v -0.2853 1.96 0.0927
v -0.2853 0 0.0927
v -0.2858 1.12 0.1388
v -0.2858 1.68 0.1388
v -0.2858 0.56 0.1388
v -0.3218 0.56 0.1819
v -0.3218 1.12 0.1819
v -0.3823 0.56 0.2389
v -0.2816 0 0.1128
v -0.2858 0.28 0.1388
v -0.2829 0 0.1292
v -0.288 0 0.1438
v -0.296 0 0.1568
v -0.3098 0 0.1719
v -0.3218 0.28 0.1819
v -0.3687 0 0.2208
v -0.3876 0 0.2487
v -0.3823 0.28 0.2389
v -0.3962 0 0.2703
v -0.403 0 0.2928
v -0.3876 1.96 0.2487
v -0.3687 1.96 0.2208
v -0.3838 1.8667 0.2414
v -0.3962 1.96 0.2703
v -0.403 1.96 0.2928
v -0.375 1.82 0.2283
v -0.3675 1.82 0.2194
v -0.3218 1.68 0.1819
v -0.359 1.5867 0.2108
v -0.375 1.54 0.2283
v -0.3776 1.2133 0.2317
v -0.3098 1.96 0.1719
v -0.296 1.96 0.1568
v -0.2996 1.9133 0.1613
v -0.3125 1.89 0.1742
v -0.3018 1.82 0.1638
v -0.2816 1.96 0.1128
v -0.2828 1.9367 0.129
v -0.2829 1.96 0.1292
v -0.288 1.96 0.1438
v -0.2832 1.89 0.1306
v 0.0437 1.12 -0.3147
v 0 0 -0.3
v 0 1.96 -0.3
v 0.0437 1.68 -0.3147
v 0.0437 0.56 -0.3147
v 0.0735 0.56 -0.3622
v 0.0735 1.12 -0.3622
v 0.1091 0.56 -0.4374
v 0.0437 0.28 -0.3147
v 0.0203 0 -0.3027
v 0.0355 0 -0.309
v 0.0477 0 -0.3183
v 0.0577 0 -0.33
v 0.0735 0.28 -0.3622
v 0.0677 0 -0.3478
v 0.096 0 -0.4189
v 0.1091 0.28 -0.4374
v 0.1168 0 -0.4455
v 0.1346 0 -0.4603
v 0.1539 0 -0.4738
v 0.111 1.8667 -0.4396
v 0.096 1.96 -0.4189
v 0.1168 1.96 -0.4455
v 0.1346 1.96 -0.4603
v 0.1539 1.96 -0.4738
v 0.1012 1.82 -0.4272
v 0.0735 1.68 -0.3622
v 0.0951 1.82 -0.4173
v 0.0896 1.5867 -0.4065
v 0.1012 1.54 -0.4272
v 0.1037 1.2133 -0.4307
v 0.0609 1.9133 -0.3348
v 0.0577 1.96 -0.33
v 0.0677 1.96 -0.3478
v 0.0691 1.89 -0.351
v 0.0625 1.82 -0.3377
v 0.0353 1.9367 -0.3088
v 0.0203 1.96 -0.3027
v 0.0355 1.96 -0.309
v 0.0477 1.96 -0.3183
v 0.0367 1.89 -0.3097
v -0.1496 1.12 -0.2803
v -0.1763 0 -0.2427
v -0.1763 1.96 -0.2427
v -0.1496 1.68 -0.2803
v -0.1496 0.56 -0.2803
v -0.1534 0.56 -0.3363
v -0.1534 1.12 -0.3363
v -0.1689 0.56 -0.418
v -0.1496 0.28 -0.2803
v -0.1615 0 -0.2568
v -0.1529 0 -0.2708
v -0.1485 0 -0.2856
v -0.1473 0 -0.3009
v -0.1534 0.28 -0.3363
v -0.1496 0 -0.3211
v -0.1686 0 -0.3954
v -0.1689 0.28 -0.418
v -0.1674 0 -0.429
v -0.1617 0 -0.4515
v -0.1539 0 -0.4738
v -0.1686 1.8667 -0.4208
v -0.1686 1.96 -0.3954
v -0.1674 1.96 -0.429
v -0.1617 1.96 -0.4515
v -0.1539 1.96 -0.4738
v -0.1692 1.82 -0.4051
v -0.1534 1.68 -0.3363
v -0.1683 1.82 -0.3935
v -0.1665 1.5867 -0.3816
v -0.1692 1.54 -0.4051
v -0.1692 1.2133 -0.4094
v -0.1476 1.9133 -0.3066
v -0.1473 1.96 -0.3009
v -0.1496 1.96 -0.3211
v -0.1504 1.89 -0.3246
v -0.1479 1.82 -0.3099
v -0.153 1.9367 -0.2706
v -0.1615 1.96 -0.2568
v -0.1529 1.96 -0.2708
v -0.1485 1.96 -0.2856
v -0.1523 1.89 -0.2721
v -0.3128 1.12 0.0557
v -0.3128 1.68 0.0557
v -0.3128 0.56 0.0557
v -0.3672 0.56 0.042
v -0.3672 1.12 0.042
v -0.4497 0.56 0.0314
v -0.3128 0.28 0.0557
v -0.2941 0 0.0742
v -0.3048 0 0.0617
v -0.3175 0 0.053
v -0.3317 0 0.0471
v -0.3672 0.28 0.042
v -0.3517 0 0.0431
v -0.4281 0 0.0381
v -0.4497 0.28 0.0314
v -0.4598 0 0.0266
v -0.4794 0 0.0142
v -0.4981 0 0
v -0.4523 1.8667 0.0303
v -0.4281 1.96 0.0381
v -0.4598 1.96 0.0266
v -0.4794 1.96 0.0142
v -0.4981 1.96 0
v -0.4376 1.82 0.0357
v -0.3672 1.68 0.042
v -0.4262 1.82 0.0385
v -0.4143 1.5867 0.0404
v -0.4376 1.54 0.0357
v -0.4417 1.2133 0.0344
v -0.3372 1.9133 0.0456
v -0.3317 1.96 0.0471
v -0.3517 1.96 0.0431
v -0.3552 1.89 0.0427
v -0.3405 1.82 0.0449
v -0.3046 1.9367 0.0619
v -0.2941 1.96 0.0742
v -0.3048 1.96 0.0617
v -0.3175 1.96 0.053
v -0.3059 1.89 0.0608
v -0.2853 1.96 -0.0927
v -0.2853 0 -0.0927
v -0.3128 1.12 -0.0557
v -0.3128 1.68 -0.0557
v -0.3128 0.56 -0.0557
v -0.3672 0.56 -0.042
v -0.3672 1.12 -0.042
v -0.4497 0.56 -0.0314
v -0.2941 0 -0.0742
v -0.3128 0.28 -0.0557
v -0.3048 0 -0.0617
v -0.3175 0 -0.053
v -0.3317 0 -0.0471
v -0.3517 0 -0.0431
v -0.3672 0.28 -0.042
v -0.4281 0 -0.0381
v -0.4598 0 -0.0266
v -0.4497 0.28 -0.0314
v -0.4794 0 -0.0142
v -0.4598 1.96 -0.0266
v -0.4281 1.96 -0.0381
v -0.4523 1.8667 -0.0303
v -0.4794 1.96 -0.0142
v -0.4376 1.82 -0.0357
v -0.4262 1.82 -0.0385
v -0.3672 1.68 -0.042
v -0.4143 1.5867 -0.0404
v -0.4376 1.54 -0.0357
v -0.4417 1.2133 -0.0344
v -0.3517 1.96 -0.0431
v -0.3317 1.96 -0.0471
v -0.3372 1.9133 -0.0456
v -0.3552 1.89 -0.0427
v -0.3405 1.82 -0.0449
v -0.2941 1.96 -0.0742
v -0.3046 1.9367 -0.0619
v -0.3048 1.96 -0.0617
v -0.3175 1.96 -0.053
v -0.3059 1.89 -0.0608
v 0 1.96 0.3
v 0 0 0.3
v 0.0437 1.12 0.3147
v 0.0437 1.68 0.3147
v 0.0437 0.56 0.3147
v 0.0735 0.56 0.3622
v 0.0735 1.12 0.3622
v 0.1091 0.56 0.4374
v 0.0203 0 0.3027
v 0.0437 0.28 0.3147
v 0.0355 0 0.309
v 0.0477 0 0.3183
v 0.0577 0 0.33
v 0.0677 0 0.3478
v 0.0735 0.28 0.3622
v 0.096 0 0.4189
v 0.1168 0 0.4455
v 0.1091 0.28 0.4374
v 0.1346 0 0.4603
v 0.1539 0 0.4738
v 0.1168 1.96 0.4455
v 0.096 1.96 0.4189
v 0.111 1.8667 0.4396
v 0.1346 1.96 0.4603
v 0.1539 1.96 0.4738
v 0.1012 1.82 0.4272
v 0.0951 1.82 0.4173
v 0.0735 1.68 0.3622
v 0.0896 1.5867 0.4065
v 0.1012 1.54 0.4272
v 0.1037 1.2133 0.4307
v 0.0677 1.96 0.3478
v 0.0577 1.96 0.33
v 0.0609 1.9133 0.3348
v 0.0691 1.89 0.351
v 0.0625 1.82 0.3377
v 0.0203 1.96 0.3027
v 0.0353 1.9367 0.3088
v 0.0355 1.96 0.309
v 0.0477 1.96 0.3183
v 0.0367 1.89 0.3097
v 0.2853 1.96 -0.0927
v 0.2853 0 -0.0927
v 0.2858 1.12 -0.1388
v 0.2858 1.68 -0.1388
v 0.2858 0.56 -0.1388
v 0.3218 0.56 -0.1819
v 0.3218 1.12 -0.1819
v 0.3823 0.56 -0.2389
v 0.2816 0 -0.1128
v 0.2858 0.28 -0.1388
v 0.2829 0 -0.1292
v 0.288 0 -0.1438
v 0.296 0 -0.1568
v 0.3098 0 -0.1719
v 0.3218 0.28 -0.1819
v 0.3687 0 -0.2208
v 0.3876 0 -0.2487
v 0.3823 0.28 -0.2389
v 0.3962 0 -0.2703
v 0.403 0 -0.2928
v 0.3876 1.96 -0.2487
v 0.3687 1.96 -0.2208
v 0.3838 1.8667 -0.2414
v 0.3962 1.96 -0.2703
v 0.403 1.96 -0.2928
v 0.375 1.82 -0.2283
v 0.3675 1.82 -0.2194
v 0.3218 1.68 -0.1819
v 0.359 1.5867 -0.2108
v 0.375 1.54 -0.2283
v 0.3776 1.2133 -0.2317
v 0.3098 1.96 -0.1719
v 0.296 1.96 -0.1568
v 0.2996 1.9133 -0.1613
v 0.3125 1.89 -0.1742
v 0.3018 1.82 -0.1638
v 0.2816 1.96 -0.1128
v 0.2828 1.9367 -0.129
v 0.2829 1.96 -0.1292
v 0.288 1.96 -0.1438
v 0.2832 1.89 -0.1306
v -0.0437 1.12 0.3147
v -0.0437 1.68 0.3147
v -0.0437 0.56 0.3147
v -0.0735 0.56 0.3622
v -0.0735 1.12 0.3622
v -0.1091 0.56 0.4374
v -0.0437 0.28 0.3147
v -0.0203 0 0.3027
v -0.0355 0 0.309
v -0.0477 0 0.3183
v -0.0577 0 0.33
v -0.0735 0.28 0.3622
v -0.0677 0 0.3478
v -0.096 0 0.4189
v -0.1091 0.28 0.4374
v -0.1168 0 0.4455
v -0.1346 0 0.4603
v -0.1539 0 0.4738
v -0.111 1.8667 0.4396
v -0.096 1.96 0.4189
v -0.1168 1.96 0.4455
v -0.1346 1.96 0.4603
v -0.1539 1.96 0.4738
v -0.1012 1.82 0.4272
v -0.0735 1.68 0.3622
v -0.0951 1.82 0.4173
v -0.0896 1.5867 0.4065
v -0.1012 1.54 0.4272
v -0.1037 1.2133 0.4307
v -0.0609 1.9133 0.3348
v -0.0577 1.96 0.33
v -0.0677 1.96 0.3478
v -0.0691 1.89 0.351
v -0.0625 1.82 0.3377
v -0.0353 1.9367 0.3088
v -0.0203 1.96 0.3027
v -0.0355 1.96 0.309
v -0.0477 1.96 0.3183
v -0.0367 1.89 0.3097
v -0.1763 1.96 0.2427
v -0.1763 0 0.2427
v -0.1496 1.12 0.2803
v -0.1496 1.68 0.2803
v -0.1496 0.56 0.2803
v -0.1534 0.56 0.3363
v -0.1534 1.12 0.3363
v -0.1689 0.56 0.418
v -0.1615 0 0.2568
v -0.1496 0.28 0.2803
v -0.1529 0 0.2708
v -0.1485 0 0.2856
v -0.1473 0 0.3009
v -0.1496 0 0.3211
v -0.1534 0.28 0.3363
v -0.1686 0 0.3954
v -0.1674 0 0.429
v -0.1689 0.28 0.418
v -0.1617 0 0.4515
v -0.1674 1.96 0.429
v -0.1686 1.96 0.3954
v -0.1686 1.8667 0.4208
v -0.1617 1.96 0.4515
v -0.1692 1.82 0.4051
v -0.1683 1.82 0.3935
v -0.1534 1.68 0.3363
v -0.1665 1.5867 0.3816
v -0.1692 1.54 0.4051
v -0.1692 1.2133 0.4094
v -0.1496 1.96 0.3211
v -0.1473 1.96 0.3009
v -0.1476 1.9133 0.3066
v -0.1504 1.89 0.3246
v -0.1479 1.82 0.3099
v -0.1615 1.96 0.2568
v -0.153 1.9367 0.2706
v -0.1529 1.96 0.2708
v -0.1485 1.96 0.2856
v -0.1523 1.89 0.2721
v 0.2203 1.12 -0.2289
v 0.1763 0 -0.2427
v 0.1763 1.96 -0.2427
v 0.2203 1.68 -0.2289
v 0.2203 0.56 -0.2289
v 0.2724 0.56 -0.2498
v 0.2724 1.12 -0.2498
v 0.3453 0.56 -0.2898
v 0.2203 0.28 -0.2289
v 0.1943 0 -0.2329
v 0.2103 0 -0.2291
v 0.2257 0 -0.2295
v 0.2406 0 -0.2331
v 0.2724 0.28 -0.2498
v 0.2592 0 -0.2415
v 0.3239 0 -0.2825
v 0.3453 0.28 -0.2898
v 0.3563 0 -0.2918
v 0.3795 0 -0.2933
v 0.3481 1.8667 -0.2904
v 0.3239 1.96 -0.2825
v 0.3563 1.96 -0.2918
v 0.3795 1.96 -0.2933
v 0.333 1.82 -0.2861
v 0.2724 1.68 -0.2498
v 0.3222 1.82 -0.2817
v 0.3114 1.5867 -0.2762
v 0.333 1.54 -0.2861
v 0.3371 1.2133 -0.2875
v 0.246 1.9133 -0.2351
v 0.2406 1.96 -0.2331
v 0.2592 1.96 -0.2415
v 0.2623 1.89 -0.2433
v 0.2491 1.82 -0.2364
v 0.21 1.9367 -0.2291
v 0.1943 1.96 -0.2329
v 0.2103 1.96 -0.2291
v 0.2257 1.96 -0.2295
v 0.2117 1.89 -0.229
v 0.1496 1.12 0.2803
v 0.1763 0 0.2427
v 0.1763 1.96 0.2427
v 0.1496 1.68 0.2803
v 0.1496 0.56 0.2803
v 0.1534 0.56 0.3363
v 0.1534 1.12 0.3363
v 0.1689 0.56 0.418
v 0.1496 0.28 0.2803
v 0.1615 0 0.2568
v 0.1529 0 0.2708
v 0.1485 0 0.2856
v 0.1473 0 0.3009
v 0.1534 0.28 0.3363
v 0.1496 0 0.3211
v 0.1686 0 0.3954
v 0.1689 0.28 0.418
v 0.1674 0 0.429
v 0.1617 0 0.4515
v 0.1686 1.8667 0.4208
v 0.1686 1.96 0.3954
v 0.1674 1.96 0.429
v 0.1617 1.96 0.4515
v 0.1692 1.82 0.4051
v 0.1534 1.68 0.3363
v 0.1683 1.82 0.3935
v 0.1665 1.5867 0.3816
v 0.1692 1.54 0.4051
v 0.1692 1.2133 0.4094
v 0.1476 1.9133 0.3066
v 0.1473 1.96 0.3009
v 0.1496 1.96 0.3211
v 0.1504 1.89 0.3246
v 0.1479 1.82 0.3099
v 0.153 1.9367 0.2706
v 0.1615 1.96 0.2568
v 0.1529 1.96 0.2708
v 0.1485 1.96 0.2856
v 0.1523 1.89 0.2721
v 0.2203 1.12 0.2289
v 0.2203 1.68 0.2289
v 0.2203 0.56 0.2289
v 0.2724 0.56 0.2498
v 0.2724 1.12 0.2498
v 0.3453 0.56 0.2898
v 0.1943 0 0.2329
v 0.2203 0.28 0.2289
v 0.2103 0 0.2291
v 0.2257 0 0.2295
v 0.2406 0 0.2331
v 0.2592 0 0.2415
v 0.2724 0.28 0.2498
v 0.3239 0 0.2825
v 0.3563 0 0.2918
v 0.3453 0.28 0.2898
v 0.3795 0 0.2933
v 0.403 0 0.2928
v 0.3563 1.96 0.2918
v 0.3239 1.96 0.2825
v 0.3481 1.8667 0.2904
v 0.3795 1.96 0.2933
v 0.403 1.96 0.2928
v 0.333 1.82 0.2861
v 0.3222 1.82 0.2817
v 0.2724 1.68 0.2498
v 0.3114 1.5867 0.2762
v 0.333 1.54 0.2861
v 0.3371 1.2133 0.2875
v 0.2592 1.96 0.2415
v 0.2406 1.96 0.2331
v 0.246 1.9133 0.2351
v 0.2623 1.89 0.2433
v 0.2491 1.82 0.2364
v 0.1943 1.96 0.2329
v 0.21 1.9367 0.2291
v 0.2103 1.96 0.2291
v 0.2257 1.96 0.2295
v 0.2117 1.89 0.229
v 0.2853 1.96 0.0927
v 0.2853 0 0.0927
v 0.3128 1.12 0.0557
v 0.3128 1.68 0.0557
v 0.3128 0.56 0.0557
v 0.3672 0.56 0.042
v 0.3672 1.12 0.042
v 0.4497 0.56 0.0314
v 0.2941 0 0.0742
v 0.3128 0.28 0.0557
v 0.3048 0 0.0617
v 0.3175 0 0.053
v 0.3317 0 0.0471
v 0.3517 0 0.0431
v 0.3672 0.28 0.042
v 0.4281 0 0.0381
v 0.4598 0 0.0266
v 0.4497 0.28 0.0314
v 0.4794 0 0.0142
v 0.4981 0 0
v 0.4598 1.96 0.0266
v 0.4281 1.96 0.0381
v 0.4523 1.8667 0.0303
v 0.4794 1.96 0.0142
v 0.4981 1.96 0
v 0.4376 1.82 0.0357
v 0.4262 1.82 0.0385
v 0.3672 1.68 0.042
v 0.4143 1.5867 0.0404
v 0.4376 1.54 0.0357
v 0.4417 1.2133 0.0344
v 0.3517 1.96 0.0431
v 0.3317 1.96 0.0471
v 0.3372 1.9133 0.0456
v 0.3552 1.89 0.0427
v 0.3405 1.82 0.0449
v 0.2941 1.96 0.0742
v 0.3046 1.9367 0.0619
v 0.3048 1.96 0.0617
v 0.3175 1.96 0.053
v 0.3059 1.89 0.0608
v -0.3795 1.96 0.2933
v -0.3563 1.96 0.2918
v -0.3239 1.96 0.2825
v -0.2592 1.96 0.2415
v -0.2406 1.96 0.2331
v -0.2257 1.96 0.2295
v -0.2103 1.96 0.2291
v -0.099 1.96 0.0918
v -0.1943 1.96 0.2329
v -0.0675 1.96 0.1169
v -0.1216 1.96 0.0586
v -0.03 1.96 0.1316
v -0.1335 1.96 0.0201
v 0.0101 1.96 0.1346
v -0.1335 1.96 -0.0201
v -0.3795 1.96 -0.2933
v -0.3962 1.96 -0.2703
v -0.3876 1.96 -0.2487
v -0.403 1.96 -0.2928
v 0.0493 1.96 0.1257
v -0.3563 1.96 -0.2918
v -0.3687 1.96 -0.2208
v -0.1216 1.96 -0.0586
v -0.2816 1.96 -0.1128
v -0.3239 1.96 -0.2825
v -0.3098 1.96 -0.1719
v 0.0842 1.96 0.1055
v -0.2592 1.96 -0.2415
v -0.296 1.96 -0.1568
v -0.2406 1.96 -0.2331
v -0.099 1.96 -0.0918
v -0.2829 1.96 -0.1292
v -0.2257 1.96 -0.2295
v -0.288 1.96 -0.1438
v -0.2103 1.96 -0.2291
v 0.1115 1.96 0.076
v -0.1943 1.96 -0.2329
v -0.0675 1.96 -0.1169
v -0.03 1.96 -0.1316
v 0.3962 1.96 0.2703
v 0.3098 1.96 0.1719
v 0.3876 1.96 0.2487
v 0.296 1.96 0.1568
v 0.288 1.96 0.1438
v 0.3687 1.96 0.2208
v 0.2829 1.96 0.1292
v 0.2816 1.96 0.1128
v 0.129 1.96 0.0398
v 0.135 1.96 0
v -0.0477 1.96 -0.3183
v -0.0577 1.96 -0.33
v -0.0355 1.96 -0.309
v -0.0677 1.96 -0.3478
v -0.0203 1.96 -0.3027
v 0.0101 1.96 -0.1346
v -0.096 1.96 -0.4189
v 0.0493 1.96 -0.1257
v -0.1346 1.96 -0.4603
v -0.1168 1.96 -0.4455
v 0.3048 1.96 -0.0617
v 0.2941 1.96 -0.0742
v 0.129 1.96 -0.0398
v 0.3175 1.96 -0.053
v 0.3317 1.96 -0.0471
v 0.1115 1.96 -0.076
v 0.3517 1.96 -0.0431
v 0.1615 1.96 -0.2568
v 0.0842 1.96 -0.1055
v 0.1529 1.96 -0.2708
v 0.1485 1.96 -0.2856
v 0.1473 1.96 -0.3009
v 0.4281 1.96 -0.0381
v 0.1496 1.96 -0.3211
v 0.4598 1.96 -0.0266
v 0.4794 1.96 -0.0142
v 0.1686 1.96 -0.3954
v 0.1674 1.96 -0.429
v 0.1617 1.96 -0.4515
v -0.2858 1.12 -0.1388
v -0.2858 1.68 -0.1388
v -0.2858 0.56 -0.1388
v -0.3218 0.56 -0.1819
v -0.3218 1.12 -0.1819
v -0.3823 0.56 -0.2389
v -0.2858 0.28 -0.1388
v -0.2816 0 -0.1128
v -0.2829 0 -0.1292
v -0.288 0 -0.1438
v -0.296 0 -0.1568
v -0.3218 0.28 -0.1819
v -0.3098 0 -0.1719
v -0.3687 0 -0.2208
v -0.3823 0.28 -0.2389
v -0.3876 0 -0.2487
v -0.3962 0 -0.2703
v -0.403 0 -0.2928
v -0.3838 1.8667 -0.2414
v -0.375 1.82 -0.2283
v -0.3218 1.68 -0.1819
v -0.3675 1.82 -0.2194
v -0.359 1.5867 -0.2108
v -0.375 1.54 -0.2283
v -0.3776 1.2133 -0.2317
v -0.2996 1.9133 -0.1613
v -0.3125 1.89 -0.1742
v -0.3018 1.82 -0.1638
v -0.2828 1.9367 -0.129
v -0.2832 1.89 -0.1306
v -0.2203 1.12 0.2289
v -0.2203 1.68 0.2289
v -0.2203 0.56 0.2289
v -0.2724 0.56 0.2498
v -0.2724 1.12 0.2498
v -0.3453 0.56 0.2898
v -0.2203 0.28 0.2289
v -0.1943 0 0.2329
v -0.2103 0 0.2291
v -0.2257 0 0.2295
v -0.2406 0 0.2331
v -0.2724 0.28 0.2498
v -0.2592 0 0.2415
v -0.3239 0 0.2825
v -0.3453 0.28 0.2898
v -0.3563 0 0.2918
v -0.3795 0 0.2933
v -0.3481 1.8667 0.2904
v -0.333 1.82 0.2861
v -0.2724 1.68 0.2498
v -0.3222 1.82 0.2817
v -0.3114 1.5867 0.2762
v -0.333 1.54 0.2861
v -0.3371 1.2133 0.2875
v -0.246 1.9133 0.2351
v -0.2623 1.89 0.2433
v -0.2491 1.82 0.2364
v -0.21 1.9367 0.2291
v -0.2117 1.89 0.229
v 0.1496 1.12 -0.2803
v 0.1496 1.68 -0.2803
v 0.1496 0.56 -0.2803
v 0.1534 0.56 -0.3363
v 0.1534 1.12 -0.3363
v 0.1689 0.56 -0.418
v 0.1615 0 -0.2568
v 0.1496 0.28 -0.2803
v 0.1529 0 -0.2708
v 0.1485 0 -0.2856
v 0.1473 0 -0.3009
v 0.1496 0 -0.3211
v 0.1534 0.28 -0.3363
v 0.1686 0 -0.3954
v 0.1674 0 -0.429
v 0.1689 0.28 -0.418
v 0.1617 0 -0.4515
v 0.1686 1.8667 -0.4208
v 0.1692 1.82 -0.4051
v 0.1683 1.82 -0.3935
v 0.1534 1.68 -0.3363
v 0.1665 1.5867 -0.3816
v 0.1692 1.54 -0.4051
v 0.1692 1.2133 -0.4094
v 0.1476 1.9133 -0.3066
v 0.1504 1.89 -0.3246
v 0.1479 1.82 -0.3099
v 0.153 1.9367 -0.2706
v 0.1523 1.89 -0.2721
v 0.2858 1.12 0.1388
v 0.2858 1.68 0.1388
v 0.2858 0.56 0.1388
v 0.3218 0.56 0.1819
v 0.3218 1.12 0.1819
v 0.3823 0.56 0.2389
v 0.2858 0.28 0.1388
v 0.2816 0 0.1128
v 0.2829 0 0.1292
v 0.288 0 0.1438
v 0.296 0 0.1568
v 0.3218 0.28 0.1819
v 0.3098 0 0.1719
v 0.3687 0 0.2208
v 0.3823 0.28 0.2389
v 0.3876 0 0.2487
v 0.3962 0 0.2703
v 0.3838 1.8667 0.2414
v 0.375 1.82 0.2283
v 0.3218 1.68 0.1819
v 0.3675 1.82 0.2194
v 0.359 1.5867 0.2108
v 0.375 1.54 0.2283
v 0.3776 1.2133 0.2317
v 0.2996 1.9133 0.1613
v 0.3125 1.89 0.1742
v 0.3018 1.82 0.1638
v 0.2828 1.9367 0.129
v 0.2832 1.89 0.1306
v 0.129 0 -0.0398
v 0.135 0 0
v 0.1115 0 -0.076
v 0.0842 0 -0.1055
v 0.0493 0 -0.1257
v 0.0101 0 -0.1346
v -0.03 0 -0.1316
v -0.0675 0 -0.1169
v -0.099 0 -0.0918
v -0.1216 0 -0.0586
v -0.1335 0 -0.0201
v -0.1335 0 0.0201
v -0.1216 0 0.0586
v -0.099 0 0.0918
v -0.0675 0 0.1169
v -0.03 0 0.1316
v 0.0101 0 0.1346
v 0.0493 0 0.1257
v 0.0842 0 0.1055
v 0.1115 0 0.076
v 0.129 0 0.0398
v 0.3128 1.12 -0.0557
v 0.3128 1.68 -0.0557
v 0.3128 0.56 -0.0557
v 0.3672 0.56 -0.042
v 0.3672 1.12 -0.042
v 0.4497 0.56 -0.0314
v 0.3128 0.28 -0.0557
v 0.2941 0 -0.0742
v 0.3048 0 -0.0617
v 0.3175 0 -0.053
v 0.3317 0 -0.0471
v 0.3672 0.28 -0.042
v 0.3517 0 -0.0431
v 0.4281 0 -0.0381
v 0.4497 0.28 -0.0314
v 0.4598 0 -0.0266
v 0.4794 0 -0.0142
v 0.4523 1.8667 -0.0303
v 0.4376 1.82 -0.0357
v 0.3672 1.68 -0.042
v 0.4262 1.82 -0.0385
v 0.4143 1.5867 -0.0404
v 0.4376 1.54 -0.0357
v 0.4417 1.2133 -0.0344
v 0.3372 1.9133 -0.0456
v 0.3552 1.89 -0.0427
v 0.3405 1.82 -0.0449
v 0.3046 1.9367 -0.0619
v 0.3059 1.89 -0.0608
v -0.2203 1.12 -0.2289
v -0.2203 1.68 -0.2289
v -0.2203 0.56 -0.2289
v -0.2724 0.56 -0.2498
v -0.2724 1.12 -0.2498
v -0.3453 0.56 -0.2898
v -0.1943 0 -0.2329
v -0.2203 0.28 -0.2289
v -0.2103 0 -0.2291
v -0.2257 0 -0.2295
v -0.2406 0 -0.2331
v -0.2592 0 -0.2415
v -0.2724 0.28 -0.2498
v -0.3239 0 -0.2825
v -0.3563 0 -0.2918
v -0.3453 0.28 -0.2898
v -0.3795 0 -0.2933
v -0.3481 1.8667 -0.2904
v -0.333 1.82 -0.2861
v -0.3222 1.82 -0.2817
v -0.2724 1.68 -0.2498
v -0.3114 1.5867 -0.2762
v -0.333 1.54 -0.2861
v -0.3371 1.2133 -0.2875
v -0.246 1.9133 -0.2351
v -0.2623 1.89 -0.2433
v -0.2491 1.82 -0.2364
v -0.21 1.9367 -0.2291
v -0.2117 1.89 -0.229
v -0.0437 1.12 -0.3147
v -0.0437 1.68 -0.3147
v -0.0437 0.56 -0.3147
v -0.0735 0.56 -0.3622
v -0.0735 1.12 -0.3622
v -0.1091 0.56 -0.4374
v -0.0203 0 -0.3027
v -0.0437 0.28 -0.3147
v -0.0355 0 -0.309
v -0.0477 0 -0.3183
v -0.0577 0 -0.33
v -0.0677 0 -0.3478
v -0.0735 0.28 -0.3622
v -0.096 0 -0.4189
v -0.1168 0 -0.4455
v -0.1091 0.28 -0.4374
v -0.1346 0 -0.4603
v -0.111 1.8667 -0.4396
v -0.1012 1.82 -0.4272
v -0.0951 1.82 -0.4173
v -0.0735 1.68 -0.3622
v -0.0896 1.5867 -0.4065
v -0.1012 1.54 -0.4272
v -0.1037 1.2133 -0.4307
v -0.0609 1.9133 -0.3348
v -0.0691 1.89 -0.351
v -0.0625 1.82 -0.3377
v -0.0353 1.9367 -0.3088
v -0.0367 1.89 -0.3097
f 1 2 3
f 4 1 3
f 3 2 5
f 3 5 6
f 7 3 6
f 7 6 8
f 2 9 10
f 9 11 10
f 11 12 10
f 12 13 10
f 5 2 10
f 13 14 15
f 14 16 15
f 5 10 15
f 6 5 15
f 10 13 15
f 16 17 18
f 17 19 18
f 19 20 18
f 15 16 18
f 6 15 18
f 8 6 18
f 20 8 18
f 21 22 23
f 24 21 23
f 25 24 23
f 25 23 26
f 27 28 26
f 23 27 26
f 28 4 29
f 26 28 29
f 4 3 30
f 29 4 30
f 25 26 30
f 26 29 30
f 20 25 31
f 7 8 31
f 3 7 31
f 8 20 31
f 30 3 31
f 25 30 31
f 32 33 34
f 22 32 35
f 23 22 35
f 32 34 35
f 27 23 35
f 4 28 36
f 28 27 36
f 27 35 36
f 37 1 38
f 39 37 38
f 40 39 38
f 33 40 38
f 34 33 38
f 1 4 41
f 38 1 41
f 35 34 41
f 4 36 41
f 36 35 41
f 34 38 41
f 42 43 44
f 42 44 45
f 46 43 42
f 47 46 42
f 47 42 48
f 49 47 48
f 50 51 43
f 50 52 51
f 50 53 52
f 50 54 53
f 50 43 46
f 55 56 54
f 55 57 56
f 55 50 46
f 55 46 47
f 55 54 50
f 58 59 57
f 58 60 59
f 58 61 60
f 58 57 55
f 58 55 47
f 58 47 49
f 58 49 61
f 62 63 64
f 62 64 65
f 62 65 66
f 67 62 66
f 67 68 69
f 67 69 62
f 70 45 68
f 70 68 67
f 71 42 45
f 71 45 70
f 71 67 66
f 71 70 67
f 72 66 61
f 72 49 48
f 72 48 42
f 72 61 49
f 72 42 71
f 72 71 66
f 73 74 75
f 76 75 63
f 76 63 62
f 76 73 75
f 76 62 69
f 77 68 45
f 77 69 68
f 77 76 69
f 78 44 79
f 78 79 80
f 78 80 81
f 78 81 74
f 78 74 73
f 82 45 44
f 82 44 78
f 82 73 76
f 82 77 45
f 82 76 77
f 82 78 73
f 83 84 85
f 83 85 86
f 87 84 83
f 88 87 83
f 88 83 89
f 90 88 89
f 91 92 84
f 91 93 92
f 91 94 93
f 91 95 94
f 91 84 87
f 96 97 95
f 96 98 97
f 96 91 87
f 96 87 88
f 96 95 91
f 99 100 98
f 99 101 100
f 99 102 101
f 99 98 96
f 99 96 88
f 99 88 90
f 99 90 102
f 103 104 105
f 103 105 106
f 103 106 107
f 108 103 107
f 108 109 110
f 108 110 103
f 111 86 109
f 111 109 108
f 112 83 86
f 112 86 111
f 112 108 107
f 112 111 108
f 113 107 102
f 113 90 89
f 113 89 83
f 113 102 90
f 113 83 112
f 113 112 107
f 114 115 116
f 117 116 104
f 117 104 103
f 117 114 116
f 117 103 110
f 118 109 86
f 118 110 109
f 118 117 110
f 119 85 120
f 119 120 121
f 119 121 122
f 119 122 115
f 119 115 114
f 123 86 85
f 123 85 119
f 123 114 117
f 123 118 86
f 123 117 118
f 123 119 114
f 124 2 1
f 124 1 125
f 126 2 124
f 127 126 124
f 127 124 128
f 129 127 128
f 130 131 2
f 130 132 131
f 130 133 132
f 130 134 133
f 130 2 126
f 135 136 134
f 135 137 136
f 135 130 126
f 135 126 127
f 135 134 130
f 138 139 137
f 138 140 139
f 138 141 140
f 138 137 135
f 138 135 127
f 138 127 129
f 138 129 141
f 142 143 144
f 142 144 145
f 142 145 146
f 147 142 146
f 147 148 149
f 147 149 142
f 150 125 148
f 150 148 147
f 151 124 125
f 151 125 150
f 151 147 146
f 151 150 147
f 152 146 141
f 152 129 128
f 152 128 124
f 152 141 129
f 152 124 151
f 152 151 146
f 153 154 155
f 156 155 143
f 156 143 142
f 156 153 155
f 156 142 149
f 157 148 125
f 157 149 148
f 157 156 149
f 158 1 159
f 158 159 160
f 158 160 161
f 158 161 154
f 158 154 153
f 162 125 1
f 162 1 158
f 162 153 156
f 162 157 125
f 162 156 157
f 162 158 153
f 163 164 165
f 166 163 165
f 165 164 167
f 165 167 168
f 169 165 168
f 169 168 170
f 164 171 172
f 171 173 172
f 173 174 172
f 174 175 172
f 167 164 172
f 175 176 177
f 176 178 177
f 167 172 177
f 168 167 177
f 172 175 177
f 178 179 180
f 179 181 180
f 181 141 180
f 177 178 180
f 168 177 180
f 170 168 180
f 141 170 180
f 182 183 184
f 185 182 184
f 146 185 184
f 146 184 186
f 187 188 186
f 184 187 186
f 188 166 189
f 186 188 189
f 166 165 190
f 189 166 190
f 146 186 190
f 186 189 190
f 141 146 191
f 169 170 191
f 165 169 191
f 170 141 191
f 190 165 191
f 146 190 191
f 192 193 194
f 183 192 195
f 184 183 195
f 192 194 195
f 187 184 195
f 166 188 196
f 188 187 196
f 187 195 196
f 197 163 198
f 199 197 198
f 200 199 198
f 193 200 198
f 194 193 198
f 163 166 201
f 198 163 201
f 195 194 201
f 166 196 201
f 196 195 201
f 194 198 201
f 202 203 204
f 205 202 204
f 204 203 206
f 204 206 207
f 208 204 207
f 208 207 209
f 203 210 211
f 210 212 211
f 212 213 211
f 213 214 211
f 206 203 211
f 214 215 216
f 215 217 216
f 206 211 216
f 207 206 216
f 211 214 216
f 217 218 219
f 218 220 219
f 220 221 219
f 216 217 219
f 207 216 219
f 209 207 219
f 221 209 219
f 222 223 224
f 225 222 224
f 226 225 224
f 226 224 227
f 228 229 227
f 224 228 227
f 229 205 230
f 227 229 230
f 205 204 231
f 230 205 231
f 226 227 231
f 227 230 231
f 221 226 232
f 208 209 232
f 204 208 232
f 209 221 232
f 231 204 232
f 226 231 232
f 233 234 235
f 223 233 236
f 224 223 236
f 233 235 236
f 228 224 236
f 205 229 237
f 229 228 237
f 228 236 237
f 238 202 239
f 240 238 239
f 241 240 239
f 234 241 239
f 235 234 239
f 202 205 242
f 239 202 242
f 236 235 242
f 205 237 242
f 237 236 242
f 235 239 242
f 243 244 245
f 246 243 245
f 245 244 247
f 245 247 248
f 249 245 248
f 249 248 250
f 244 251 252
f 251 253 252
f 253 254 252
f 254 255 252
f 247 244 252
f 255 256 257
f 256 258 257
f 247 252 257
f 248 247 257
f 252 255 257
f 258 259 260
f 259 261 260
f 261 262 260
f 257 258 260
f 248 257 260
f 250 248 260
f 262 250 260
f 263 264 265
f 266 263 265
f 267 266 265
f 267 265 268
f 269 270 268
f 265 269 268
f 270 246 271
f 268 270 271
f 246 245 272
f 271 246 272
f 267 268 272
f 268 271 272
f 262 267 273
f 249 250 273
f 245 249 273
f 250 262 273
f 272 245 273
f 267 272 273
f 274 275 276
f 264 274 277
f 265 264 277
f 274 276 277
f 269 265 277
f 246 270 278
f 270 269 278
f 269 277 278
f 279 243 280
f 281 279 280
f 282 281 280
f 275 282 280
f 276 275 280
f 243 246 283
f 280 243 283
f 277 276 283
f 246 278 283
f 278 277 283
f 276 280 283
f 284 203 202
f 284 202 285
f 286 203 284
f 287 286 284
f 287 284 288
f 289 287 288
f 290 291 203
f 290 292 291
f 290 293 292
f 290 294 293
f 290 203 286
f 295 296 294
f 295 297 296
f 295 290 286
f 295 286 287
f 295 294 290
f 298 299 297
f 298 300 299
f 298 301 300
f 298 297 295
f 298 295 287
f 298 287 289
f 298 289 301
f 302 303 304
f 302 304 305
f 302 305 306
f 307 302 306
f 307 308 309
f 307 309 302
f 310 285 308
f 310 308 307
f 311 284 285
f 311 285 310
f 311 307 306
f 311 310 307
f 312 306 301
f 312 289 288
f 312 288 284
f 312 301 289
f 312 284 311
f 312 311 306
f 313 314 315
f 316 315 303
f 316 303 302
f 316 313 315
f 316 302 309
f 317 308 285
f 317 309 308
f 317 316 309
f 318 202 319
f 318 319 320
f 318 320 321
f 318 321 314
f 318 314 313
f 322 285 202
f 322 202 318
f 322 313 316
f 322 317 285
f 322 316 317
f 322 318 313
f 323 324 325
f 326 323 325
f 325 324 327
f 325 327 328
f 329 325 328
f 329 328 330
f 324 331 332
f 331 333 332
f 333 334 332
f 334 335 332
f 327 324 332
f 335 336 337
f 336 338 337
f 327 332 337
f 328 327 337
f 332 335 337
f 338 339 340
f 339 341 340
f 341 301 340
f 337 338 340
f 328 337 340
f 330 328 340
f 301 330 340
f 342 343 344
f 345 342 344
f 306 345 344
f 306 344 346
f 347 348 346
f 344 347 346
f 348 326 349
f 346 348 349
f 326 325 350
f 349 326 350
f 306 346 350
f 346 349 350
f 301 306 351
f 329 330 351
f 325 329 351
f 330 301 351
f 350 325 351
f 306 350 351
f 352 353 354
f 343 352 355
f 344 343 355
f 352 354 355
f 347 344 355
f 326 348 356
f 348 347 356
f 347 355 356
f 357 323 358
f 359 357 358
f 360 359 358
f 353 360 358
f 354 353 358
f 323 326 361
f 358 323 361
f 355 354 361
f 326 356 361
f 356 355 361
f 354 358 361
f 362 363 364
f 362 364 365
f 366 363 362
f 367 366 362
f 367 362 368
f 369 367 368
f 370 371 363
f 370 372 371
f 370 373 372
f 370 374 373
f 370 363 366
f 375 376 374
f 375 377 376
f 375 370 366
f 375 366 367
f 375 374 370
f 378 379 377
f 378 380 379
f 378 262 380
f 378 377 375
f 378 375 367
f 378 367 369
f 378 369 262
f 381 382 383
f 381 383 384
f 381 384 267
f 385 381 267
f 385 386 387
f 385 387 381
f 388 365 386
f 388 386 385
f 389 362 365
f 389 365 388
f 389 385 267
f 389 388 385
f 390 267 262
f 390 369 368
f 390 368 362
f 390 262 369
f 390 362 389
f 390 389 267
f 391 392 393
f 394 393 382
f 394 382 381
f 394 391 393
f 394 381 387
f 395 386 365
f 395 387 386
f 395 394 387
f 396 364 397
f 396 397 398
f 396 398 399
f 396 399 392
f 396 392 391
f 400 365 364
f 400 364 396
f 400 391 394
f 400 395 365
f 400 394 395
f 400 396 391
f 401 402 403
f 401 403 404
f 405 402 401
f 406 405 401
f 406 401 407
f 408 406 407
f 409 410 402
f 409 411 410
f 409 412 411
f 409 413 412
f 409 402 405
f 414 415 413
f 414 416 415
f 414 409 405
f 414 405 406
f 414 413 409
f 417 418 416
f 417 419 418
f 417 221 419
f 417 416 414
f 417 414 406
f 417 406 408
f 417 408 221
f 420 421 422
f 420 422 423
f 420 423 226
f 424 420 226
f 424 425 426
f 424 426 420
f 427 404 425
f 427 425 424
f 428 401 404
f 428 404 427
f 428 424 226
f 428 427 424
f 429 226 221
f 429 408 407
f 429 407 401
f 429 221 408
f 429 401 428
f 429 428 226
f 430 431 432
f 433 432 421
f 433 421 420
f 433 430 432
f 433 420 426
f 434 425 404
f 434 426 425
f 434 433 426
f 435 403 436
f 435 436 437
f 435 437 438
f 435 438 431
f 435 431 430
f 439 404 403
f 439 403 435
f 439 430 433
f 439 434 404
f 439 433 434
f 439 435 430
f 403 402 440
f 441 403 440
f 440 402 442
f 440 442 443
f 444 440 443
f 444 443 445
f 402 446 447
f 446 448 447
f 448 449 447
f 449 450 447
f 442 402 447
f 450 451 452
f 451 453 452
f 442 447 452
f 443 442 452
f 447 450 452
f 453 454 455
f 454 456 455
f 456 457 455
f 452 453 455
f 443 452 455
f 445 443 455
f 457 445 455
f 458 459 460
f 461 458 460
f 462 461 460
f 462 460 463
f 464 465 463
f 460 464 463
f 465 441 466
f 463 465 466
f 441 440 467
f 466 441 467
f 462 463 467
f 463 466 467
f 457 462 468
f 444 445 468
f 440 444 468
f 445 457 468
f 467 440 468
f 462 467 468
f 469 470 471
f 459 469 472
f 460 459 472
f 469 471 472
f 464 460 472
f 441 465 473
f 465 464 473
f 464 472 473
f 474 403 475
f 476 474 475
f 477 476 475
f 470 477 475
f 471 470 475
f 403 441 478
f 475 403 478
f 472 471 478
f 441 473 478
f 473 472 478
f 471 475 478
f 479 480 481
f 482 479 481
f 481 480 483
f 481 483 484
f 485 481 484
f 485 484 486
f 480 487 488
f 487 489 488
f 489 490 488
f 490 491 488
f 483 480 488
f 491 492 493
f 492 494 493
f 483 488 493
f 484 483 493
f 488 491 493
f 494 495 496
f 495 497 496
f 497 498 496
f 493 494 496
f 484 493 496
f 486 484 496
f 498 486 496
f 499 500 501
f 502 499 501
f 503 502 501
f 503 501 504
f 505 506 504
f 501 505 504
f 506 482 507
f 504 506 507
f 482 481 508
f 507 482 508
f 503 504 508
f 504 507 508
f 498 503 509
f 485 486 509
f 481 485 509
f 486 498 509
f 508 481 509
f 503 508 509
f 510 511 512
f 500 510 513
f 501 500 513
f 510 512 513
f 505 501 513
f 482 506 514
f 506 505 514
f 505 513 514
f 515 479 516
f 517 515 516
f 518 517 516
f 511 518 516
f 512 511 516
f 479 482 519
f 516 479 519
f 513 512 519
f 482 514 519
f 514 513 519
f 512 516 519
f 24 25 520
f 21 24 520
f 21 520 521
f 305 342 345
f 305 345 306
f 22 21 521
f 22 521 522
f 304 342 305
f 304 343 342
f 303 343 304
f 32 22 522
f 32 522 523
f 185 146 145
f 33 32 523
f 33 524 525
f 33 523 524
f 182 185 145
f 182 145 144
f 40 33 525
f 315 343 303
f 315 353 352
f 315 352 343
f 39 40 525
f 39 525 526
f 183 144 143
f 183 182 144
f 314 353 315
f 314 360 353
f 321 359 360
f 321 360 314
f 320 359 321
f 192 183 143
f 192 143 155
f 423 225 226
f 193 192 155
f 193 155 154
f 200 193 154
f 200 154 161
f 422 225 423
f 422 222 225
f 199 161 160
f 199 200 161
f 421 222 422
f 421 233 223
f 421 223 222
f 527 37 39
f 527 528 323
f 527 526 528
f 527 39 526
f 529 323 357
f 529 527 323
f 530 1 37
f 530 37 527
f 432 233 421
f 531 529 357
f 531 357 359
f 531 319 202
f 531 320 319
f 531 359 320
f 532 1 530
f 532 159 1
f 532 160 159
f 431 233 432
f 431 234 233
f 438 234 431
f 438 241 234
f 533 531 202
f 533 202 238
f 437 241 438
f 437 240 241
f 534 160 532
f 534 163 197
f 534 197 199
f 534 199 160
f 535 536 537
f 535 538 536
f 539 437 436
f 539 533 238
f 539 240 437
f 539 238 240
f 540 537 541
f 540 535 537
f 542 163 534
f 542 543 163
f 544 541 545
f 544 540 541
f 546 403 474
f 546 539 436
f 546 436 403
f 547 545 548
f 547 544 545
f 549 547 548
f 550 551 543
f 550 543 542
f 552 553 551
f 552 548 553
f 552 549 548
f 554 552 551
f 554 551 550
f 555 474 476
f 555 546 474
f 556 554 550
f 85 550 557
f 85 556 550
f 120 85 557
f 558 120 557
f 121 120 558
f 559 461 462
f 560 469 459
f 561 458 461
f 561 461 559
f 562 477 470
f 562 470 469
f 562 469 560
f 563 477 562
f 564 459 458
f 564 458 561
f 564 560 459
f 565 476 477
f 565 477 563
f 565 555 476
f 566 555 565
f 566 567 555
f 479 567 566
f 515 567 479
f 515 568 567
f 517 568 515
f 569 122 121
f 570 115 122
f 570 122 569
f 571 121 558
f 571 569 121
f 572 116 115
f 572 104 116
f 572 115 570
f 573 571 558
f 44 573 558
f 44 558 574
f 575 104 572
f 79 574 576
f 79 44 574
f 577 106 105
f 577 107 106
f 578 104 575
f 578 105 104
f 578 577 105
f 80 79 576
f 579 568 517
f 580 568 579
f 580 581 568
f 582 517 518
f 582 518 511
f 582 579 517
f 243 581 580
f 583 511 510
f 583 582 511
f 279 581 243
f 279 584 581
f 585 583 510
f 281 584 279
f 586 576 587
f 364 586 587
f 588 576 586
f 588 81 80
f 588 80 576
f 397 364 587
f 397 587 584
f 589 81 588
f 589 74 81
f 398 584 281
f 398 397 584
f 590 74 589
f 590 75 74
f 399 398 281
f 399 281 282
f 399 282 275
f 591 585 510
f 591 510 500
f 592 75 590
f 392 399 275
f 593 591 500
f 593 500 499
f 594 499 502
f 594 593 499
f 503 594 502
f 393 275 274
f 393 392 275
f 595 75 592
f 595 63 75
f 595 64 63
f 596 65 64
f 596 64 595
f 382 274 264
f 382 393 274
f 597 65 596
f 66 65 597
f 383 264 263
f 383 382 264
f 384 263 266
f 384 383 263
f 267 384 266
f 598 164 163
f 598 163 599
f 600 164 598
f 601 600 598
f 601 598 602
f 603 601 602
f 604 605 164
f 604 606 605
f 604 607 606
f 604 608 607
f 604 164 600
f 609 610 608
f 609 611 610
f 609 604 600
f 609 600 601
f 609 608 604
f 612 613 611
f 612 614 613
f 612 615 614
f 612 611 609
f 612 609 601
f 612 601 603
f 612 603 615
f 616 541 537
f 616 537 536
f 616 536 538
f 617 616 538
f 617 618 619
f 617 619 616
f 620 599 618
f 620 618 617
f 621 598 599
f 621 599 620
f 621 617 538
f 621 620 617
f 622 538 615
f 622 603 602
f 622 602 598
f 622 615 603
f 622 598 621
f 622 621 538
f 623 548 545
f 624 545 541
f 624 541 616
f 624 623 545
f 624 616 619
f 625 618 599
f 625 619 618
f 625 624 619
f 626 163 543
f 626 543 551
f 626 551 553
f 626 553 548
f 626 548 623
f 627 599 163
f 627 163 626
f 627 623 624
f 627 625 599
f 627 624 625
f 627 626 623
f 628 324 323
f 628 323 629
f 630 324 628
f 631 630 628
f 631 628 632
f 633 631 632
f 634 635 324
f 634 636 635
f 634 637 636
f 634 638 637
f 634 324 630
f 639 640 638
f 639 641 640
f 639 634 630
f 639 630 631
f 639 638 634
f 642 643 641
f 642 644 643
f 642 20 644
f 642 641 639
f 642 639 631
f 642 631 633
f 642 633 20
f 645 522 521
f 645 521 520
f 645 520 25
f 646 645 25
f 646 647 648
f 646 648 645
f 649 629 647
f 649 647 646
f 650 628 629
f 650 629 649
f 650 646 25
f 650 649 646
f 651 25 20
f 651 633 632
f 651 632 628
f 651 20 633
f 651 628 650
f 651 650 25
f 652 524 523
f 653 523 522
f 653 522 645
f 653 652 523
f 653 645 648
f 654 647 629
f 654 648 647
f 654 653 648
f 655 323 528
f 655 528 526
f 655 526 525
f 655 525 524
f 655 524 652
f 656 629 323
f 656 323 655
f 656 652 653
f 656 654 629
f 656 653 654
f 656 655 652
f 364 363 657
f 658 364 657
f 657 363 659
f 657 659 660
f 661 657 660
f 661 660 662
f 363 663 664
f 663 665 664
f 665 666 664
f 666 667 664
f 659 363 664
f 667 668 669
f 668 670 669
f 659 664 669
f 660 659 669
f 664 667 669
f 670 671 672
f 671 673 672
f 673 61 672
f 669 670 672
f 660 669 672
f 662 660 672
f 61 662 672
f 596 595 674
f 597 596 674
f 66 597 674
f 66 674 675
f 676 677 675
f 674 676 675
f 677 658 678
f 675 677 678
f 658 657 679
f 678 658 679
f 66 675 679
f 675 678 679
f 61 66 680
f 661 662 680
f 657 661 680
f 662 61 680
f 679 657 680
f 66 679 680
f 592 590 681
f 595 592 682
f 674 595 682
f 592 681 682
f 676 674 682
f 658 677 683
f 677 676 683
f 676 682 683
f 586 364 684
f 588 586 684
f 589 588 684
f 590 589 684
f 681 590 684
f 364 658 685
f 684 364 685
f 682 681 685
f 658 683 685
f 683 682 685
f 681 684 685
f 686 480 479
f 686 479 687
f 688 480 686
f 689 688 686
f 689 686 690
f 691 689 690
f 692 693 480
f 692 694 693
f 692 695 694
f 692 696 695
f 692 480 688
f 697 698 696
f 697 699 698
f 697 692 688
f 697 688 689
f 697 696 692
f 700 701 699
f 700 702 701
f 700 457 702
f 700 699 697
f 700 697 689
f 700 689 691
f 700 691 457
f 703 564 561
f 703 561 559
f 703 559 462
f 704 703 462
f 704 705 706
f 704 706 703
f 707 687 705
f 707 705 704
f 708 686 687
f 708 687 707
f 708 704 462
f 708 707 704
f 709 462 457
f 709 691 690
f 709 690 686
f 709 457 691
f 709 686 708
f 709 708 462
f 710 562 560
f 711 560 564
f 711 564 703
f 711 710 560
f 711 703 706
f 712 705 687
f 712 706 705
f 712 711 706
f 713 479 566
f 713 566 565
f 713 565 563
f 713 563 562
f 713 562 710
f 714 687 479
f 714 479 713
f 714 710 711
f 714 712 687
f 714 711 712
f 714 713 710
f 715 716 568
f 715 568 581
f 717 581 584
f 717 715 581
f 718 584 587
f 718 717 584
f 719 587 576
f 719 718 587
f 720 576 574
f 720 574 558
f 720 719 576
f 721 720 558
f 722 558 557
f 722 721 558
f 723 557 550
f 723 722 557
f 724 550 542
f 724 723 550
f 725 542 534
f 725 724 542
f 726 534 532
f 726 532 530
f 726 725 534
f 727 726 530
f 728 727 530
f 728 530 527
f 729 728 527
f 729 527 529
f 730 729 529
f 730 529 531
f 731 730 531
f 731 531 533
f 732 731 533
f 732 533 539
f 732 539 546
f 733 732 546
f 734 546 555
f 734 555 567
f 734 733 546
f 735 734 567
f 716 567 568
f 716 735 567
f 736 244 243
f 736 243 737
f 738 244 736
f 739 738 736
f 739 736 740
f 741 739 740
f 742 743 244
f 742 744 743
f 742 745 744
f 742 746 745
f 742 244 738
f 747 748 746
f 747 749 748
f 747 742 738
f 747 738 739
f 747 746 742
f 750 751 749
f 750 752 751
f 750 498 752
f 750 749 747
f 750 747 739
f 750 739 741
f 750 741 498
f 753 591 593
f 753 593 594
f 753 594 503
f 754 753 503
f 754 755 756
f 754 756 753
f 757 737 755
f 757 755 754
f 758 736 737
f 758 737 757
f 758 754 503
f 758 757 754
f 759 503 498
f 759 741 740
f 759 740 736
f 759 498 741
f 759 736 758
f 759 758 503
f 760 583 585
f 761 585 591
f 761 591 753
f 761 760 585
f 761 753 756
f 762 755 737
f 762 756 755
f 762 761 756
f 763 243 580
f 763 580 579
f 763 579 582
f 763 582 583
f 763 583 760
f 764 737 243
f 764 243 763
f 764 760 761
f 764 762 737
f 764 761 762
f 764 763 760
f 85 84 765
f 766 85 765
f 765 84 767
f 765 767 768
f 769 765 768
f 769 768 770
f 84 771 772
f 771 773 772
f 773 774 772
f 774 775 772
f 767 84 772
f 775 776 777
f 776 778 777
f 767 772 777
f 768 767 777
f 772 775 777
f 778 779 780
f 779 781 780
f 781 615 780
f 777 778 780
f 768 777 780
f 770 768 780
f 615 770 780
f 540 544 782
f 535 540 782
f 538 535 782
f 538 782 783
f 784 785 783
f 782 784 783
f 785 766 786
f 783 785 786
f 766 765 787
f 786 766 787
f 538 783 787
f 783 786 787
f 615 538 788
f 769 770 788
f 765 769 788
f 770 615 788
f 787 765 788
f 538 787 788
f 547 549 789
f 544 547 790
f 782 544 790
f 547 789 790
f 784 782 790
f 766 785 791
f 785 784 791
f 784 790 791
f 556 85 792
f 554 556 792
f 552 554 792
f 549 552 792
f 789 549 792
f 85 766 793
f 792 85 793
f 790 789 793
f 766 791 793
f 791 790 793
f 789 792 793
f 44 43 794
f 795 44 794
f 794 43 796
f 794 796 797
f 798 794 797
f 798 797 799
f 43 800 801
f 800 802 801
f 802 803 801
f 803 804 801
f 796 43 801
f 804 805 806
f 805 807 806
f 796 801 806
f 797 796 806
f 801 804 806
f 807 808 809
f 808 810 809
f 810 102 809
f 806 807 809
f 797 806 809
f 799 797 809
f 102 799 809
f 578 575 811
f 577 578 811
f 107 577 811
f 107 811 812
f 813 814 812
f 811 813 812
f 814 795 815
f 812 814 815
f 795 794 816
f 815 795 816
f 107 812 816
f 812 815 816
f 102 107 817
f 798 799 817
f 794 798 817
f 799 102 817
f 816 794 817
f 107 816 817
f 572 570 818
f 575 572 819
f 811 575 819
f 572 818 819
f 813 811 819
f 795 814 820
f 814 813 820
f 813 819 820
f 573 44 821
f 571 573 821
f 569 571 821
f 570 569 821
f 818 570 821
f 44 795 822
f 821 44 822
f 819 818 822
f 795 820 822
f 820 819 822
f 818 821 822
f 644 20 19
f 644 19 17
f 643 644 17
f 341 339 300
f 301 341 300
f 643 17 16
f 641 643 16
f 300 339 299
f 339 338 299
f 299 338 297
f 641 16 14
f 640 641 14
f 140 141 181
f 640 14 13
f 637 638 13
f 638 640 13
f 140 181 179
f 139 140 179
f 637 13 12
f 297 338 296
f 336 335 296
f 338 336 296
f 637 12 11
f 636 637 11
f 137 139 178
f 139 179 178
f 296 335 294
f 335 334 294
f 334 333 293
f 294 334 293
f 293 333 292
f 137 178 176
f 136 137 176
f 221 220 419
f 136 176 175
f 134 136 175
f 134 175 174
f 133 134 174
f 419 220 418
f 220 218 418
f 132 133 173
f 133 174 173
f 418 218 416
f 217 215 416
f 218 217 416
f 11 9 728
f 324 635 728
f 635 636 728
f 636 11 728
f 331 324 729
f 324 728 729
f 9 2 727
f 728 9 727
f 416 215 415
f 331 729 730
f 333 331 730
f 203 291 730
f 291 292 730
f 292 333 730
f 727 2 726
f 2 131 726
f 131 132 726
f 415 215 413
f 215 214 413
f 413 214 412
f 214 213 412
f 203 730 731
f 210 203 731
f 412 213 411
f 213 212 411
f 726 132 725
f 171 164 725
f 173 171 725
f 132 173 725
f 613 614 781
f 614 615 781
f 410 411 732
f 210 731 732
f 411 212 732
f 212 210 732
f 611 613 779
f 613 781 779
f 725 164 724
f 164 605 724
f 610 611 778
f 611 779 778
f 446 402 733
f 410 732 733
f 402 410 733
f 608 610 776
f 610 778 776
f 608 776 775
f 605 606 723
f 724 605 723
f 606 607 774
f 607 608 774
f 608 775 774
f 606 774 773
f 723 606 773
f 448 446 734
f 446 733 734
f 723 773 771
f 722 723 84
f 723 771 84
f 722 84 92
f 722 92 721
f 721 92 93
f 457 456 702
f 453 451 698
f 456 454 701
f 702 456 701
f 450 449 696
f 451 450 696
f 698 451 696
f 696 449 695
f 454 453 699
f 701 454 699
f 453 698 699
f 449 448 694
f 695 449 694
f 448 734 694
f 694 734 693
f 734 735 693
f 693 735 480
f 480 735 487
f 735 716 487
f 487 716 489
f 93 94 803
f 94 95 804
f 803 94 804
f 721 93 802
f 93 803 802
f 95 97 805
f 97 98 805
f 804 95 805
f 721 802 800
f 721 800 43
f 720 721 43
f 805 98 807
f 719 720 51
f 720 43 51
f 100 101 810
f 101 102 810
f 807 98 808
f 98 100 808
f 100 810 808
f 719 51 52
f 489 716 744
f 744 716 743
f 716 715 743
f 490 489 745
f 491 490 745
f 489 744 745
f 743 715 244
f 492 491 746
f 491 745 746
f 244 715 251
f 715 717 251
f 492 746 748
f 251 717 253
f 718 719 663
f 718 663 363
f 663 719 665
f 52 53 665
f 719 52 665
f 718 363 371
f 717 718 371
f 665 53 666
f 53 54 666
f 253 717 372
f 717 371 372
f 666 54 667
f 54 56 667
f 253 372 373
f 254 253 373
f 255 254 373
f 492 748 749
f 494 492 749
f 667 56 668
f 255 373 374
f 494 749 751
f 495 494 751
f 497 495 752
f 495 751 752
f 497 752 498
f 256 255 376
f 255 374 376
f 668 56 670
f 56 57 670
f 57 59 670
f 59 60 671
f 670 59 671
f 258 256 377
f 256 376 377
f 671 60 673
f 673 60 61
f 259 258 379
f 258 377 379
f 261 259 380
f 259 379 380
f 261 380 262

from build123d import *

# Parameters (mm, degrees)
SKETCH1_R           = 0.135
BOSS_EXTRUDE1_DEPTH = 1.96


with BuildPart() as part:
    # Sketch1 → Boss-Extrude1 (new body)
    with BuildSketch(Plane(origin=(0, 0, 0), x_dir=(1, 0, 0), z_dir=(0, 1, 0))):
        with BuildLine():
            add(Edge.make_bspline(
                [(0, 0.3), (-0.008002457, 0.300602495), (-0.023736253, 0.301787073), (-0.045361581, 0.314161102), (-0.062540556, 0.334948279), (-0.075080185, 0.364286352), (-0.085352075, 0.400976515), (-0.108864183, 0.443326409), (-0.137745473, 0.462827005), (-0.153932889, 0.473756719)],
                knots=[0, 0, 0, 0, 0.097339296, 0.191380791, 0.295712293, 0.422744131, 0.578988083, 0.76403079, 1, 1, 1, 1], degree=3))
            add(Edge.make_bspline(
                [(-0.176335576, 0.242705098), (-0.170215589, 0.247896254), (-0.158182958, 0.258102691), (-0.147960973, 0.280824539), (-0.146281286, 0.307739267), (-0.153381, 0.338844875), (-0.166636802, 0.374565506), (-0.172507751, 0.422647361), (-0.160604459, 0.45539967), (-0.153932889, 0.473756719)],
                knots=[0, 0, 0, 0, 0.097339296, 0.191380791, 0.295712293, 0.422744131, 0.578988083, 0.76403079, 1, 1, 1, 1], degree=3))
            add(Edge.make_bspline(
                [(-0.176335576, 0.242705098), (-0.183163837, 0.238488801), (-0.196589023, 0.230199051), (-0.221357552, 0.227498802), (-0.247474031, 0.234218434), (-0.274863291, 0.250582824), (-0.304739361, 0.274228124), (-0.3486537, 0.294669838), (-0.383481316, 0.293470155), (-0.403001536, 0.292797755)],
                knots=[0, 0, 0, 0, 0.097339296, 0.191380791, 0.295712293, 0.422744131, 0.578988083, 0.76403079, 1, 1, 1, 1], degree=3))
            add(Edge.make_bspline(
                [(-0.285316955, 0.092705098), (-0.283417066, 0.100502069), (-0.279681657, 0.115831853), (-0.284767464, 0.140222546), (-0.299228649, 0.162984314), (-0.323255856, 0.183976173), (-0.354976085, 0.205083205), (-0.387987588, 0.240531385), (-0.397608947, 0.27402514), (-0.403001536, 0.292797755)],
                knots=[0, 0, 0, 0, 0.097339296, 0.191380791, 0.295712293, 0.422744131, 0.578988083, 0.76403079, 1, 1, 1, 1], degree=3))
            add(Edge.make_bspline(
                [(-0.285316955, 0.092705098), (-0.288362857, 0.08528049), (-0.294351468, 0.070682816), (-0.312802462, 0.053939692), (-0.337880838, 0.044025107), (-0.369657962, 0.041165175), (-0.407726569, 0.04273391), (-0.455269353, 0.033459404), (-0.482740331, 0.01201768), (-0.498137294, 0)],
                knots=[0, 0, 0, 0, 0.097339296, 0.191380791, 0.295712293, 0.422744131, 0.578988083, 0.76403079, 1, 1, 1, 1], degree=3))
            add(Edge.make_bspline(
                [(-0.285316955, -0.092705098), (-0.288362857, -0.08528049), (-0.294351468, -0.070682816), (-0.312802462, -0.053939692), (-0.337880838, -0.044025107), (-0.369657962, -0.041165175), (-0.407726569, -0.04273391), (-0.455269353, -0.033459404), (-0.482740331, -0.01201768), (-0.498137294, 0)],
                knots=[0, 0, 0, 0, 0.097339296, 0.191380791, 0.295712293, 0.422744131, 0.578988083, 0.76403079, 1, 1, 1, 1], degree=3))
            add(Edge.make_bspline(
                [(-0.285316955, -0.092705098), (-0.283417066, -0.100502069), (-0.279681657, -0.115831853), (-0.284767464, -0.140222546), (-0.299228649, -0.162984314), (-0.323255856, -0.183976173), (-0.354976085, -0.205083205), (-0.387987588, -0.240531385), (-0.397608947, -0.27402514), (-0.403001536, -0.292797755)],
                knots=[0, 0, 0, 0, 0.097339296, 0.191380791, 0.295712293, 0.422744131, 0.578988083, 0.76403079, 1, 1, 1, 1], degree=3))
            add(Edge.make_bspline(
                [(-0.176335576, -0.242705098), (-0.183163837, -0.238488801), (-0.196589023, -0.230199051), (-0.221357552, -0.227498802), (-0.247474031, -0.234218434), (-0.274863291, -0.250582824), (-0.304739361, -0.274228124), (-0.3486537, -0.294669838), (-0.383481316, -0.293470155), (-0.403001536, -0.292797755)],
                knots=[0, 0, 0, 0, 0.097339296, 0.191380791, 0.295712293, 0.422744131, 0.578988083, 0.76403079, 1, 1, 1, 1], degree=3))
            add(Edge.make_bspline(
                [(-0.176335576, -0.242705098), (-0.170215589, -0.247896254), (-0.158182958, -0.258102691), (-0.147960973, -0.280824539), (-0.146281286, -0.307739267), (-0.153381, -0.338844875), (-0.166636802, -0.374565506), (-0.172507751, -0.422647361), (-0.160604459, -0.45539967), (-0.153932889, -0.473756719)],
                knots=[0, 0, 0, 0, 0.097339296, 0.191380791, 0.295712293, 0.422744131, 0.578988083, 0.76403079, 1, 1, 1, 1], degree=3))
            add(Edge.make_bspline(
                [(0, -0.3), (-0.008002457, -0.300602495), (-0.023736253, -0.301787073), (-0.045361581, -0.314161102), (-0.062540556, -0.334948279), (-0.075080185, -0.364286352), (-0.085352075, -0.400976515), (-0.108864183, -0.443326409), (-0.137745473, -0.462827005), (-0.153932889, -0.473756719)],
                knots=[0, 0, 0, 0, 0.097339296, 0.191380791, 0.295712293, 0.422744131, 0.578988083, 0.76403079, 1, 1, 1, 1], degree=3))
            add(Edge.make_bspline(
                [(0, -0.3), (0.008002457, -0.300602495), (0.023736253, -0.301787073), (0.045361581, -0.314161102), (0.062540556, -0.334948279), (0.075080185, -0.364286352), (0.085352075, -0.400976515), (0.108864183, -0.443326409), (0.137745473, -0.462827005), (0.153932889, -0.473756719)],
                knots=[0, 0, 0, 0, 0.097339296, 0.191380791, 0.295712293, 0.422744131, 0.578988083, 0.76403079, 1, 1, 1, 1], degree=3))
            add(Edge.make_bspline(
                [(0.176335576, -0.242705098), (0.170215589, -0.247896254), (0.158182958, -0.258102691), (0.147960973, -0.280824539), (0.146281286, -0.307739267), (0.153381, -0.338844875), (0.166636802, -0.374565506), (0.172507751, -0.422647361), (0.160604459, -0.45539967), (0.153932889, -0.473756719)],
                knots=[0, 0, 0, 0, 0.097339296, 0.191380791, 0.295712293, 0.422744131, 0.578988083, 0.76403079, 1, 1, 1, 1], degree=3))
            add(Edge.make_bspline(
                [(0.176335576, -0.242705098), (0.183163837, -0.238488801), (0.196589023, -0.230199051), (0.221357552, -0.227498802), (0.247474031, -0.234218434), (0.274863291, -0.250582824), (0.304739361, -0.274228124), (0.3486537, -0.294669838), (0.383481316, -0.293470155), (0.403001536, -0.292797755)],
                knots=[0, 0, 0, 0, 0.097339296, 0.191380791, 0.295712293, 0.422744131, 0.578988083, 0.76403079, 1, 1, 1, 1], degree=3))
            add(Edge.make_bspline(
                [(0.285316955, -0.092705098), (0.283417066, -0.100502069), (0.279681657, -0.115831853), (0.284767464, -0.140222546), (0.299228649, -0.162984314), (0.323255856, -0.183976173), (0.354976085, -0.205083205), (0.387987588, -0.240531385), (0.397608947, -0.27402514), (0.403001536, -0.292797755)],
                knots=[0, 0, 0, 0, 0.097339296, 0.191380791, 0.295712293, 0.422744131, 0.578988083, 0.76403079, 1, 1, 1, 1], degree=3))
            add(Edge.make_bspline(
                [(0.285316955, -0.092705098), (0.288362857, -0.08528049), (0.294351468, -0.070682816), (0.312802462, -0.053939692), (0.337880838, -0.044025107), (0.369657962, -0.041165175), (0.407726569, -0.04273391), (0.455269353, -0.033459404), (0.482740331, -0.01201768), (0.498137294, 0)],
                knots=[0, 0, 0, 0, 0.097339296, 0.191380791, 0.295712293, 0.422744131, 0.578988083, 0.76403079, 1, 1, 1, 1], degree=3))
            add(Edge.make_bspline(
                [(0.285316955, 0.092705098), (0.288362857, 0.08528049), (0.294351468, 0.070682816), (0.312802462, 0.053939692), (0.337880838, 0.044025107), (0.369657962, 0.041165175), (0.407726569, 0.04273391), (0.455269353, 0.033459404), (0.482740331, 0.01201768), (0.498137294, 0)],
                knots=[0, 0, 0, 0, 0.097339296, 0.191380791, 0.295712293, 0.422744131, 0.578988083, 0.76403079, 1, 1, 1, 1], degree=3))
            add(Edge.make_bspline(
                [(0.285316955, 0.092705098), (0.283417066, 0.100502069), (0.279681657, 0.115831853), (0.284767464, 0.140222546), (0.299228649, 0.162984314), (0.323255856, 0.183976173), (0.354976085, 0.205083205), (0.387987588, 0.240531385), (0.397608947, 0.27402514), (0.403001536, 0.292797755)],
                knots=[0, 0, 0, 0, 0.097339296, 0.191380791, 0.295712293, 0.422744131, 0.578988083, 0.76403079, 1, 1, 1, 1], degree=3))
            add(Edge.make_bspline(
                [(0.176335576, 0.242705098), (0.183163837, 0.238488801), (0.196589023, 0.230199051), (0.221357552, 0.227498802), (0.247474031, 0.234218434), (0.274863291, 0.250582824), (0.304739361, 0.274228124), (0.3486537, 0.294669838), (0.383481316, 0.293470155), (0.403001536, 0.292797755)],
                knots=[0, 0, 0, 0, 0.097339296, 0.191380791, 0.295712293, 0.422744131, 0.578988083, 0.76403079, 1, 1, 1, 1], degree=3))
            add(Edge.make_bspline(
                [(0.176335576, 0.242705098), (0.170215589, 0.247896254), (0.158182958, 0.258102691), (0.147960973, 0.280824539), (0.146281286, 0.307739267), (0.153381, 0.338844875), (0.166636802, 0.374565506), (0.172507751, 0.422647361), (0.160604459, 0.45539967), (0.153932889, 0.473756719)],
                knots=[0, 0, 0, 0, 0.097339296, 0.191380791, 0.295712293, 0.422744131, 0.578988083, 0.76403079, 1, 1, 1, 1], degree=3))
            add(Edge.make_bspline(
                [(0, 0.3), (0.008002457, 0.300602495), (0.023736253, 0.301787073), (0.045361581, 0.314161102), (0.062540556, 0.334948279), (0.075080185, 0.364286352), (0.085352075, 0.400976515), (0.108864183, 0.443326409), (0.137745473, 0.462827005), (0.153932889, 0.473756719)],
                knots=[0, 0, 0, 0, 0.097339296, 0.191380791, 0.295712293, 0.422744131, 0.578988083, 0.76403079, 1, 1, 1, 1], degree=3))
        make_face()
        Circle(SKETCH1_R, mode=Mode.SUBTRACT)
    extrude(amount=BOSS_EXTRUDE1_DEPTH)


solid = part.part
